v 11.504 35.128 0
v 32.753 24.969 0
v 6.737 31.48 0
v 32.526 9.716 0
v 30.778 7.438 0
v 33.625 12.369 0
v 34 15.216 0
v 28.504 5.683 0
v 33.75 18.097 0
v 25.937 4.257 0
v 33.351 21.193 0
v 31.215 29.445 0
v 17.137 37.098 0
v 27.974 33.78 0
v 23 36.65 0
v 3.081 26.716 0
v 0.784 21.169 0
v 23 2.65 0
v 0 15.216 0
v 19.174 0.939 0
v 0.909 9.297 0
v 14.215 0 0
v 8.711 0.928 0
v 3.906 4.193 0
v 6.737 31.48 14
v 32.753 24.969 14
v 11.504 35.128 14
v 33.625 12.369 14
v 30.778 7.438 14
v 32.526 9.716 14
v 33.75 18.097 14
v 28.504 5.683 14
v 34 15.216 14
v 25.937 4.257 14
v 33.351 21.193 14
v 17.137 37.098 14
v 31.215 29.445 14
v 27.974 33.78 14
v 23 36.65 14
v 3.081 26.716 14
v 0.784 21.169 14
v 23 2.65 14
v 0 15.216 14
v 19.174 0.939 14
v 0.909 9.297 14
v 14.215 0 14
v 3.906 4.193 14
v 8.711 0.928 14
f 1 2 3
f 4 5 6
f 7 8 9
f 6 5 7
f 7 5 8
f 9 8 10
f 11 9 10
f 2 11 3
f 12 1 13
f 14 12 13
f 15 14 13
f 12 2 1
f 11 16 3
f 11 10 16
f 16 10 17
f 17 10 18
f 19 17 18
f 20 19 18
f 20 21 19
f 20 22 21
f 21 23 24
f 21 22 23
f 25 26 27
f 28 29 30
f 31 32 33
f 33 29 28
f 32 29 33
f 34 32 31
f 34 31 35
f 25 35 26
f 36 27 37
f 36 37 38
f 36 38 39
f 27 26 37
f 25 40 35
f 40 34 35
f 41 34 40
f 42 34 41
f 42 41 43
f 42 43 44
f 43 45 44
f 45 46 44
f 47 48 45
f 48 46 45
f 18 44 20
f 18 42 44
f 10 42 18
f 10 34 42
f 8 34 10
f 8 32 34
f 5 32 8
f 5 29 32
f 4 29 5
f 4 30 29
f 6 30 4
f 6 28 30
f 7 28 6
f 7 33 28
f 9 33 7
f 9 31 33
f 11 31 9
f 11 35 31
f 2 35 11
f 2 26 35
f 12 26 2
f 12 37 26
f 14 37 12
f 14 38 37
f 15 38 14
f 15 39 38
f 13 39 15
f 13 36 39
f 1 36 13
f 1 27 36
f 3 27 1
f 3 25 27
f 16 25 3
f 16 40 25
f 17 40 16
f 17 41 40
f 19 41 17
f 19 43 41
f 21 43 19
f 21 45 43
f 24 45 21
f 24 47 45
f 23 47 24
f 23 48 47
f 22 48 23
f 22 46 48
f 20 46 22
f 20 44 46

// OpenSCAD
$fn = 32;

// ----------------------------------------------------------------------
// Cam disc: base radius 11.0 mm, lift 12.0 mm, 24 profile points
// ----------------------------------------------------------------------

// --- parameters (mm) ---
profile_height = 14;      // extrusion height
profile_points = 24;      // points of the closed outline

profile = [[34, 15.216], [33.75, 18.097], [33.351, 21.193], [32.753, 24.969], [31.215, 29.445], [27.974, 33.78], [23, 36.65], [17.137, 37.098], [11.504, 35.128], [6.737, 31.48], [3.081, 26.716], [0.784, 21.169], [0, 15.216], [0.909, 9.297], [3.906, 4.193], [8.711, 0.928], [14.215, 0], [19.174, 0.939], [23, 2.65], [25.937, 4.257], [28.504, 5.683], [30.778, 7.438], [32.526, 9.716], [33.625, 12.369]];  // single closed polygon, 24 points, counter clockwise

// --- the one profile operation ---
linear_extrude(height = profile_height) polygon(points = profile);
